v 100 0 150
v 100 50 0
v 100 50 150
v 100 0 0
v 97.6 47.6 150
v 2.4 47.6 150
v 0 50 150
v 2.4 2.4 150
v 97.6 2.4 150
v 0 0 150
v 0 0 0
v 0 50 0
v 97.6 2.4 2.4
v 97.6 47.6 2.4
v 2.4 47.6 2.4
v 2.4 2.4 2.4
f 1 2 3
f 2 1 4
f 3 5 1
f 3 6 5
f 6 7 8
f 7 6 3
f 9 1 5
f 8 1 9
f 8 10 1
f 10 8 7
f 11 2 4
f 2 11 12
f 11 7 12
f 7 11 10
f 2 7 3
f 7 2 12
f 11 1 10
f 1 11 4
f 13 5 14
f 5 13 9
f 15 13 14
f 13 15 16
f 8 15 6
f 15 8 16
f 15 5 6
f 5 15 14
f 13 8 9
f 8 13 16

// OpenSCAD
// Bookmark Display - Parametric Design

/* [General] */
// Height of the display
display_height = 150;
// Width of the display
display_width = 100;
// Depth of the display
display_depth = 50;
// Thickness of the walls
wall_thickness = 2.4;

/* [Internal] */

module main() {
    difference() {
        cube([display_width, display_depth, display_height]);
        translate([wall_thickness, wall_thickness, wall_thickness])
            cube([display_width - 2*wall_thickness, display_depth - 2*wall_thickness, display_height]);
    }
}

main();
